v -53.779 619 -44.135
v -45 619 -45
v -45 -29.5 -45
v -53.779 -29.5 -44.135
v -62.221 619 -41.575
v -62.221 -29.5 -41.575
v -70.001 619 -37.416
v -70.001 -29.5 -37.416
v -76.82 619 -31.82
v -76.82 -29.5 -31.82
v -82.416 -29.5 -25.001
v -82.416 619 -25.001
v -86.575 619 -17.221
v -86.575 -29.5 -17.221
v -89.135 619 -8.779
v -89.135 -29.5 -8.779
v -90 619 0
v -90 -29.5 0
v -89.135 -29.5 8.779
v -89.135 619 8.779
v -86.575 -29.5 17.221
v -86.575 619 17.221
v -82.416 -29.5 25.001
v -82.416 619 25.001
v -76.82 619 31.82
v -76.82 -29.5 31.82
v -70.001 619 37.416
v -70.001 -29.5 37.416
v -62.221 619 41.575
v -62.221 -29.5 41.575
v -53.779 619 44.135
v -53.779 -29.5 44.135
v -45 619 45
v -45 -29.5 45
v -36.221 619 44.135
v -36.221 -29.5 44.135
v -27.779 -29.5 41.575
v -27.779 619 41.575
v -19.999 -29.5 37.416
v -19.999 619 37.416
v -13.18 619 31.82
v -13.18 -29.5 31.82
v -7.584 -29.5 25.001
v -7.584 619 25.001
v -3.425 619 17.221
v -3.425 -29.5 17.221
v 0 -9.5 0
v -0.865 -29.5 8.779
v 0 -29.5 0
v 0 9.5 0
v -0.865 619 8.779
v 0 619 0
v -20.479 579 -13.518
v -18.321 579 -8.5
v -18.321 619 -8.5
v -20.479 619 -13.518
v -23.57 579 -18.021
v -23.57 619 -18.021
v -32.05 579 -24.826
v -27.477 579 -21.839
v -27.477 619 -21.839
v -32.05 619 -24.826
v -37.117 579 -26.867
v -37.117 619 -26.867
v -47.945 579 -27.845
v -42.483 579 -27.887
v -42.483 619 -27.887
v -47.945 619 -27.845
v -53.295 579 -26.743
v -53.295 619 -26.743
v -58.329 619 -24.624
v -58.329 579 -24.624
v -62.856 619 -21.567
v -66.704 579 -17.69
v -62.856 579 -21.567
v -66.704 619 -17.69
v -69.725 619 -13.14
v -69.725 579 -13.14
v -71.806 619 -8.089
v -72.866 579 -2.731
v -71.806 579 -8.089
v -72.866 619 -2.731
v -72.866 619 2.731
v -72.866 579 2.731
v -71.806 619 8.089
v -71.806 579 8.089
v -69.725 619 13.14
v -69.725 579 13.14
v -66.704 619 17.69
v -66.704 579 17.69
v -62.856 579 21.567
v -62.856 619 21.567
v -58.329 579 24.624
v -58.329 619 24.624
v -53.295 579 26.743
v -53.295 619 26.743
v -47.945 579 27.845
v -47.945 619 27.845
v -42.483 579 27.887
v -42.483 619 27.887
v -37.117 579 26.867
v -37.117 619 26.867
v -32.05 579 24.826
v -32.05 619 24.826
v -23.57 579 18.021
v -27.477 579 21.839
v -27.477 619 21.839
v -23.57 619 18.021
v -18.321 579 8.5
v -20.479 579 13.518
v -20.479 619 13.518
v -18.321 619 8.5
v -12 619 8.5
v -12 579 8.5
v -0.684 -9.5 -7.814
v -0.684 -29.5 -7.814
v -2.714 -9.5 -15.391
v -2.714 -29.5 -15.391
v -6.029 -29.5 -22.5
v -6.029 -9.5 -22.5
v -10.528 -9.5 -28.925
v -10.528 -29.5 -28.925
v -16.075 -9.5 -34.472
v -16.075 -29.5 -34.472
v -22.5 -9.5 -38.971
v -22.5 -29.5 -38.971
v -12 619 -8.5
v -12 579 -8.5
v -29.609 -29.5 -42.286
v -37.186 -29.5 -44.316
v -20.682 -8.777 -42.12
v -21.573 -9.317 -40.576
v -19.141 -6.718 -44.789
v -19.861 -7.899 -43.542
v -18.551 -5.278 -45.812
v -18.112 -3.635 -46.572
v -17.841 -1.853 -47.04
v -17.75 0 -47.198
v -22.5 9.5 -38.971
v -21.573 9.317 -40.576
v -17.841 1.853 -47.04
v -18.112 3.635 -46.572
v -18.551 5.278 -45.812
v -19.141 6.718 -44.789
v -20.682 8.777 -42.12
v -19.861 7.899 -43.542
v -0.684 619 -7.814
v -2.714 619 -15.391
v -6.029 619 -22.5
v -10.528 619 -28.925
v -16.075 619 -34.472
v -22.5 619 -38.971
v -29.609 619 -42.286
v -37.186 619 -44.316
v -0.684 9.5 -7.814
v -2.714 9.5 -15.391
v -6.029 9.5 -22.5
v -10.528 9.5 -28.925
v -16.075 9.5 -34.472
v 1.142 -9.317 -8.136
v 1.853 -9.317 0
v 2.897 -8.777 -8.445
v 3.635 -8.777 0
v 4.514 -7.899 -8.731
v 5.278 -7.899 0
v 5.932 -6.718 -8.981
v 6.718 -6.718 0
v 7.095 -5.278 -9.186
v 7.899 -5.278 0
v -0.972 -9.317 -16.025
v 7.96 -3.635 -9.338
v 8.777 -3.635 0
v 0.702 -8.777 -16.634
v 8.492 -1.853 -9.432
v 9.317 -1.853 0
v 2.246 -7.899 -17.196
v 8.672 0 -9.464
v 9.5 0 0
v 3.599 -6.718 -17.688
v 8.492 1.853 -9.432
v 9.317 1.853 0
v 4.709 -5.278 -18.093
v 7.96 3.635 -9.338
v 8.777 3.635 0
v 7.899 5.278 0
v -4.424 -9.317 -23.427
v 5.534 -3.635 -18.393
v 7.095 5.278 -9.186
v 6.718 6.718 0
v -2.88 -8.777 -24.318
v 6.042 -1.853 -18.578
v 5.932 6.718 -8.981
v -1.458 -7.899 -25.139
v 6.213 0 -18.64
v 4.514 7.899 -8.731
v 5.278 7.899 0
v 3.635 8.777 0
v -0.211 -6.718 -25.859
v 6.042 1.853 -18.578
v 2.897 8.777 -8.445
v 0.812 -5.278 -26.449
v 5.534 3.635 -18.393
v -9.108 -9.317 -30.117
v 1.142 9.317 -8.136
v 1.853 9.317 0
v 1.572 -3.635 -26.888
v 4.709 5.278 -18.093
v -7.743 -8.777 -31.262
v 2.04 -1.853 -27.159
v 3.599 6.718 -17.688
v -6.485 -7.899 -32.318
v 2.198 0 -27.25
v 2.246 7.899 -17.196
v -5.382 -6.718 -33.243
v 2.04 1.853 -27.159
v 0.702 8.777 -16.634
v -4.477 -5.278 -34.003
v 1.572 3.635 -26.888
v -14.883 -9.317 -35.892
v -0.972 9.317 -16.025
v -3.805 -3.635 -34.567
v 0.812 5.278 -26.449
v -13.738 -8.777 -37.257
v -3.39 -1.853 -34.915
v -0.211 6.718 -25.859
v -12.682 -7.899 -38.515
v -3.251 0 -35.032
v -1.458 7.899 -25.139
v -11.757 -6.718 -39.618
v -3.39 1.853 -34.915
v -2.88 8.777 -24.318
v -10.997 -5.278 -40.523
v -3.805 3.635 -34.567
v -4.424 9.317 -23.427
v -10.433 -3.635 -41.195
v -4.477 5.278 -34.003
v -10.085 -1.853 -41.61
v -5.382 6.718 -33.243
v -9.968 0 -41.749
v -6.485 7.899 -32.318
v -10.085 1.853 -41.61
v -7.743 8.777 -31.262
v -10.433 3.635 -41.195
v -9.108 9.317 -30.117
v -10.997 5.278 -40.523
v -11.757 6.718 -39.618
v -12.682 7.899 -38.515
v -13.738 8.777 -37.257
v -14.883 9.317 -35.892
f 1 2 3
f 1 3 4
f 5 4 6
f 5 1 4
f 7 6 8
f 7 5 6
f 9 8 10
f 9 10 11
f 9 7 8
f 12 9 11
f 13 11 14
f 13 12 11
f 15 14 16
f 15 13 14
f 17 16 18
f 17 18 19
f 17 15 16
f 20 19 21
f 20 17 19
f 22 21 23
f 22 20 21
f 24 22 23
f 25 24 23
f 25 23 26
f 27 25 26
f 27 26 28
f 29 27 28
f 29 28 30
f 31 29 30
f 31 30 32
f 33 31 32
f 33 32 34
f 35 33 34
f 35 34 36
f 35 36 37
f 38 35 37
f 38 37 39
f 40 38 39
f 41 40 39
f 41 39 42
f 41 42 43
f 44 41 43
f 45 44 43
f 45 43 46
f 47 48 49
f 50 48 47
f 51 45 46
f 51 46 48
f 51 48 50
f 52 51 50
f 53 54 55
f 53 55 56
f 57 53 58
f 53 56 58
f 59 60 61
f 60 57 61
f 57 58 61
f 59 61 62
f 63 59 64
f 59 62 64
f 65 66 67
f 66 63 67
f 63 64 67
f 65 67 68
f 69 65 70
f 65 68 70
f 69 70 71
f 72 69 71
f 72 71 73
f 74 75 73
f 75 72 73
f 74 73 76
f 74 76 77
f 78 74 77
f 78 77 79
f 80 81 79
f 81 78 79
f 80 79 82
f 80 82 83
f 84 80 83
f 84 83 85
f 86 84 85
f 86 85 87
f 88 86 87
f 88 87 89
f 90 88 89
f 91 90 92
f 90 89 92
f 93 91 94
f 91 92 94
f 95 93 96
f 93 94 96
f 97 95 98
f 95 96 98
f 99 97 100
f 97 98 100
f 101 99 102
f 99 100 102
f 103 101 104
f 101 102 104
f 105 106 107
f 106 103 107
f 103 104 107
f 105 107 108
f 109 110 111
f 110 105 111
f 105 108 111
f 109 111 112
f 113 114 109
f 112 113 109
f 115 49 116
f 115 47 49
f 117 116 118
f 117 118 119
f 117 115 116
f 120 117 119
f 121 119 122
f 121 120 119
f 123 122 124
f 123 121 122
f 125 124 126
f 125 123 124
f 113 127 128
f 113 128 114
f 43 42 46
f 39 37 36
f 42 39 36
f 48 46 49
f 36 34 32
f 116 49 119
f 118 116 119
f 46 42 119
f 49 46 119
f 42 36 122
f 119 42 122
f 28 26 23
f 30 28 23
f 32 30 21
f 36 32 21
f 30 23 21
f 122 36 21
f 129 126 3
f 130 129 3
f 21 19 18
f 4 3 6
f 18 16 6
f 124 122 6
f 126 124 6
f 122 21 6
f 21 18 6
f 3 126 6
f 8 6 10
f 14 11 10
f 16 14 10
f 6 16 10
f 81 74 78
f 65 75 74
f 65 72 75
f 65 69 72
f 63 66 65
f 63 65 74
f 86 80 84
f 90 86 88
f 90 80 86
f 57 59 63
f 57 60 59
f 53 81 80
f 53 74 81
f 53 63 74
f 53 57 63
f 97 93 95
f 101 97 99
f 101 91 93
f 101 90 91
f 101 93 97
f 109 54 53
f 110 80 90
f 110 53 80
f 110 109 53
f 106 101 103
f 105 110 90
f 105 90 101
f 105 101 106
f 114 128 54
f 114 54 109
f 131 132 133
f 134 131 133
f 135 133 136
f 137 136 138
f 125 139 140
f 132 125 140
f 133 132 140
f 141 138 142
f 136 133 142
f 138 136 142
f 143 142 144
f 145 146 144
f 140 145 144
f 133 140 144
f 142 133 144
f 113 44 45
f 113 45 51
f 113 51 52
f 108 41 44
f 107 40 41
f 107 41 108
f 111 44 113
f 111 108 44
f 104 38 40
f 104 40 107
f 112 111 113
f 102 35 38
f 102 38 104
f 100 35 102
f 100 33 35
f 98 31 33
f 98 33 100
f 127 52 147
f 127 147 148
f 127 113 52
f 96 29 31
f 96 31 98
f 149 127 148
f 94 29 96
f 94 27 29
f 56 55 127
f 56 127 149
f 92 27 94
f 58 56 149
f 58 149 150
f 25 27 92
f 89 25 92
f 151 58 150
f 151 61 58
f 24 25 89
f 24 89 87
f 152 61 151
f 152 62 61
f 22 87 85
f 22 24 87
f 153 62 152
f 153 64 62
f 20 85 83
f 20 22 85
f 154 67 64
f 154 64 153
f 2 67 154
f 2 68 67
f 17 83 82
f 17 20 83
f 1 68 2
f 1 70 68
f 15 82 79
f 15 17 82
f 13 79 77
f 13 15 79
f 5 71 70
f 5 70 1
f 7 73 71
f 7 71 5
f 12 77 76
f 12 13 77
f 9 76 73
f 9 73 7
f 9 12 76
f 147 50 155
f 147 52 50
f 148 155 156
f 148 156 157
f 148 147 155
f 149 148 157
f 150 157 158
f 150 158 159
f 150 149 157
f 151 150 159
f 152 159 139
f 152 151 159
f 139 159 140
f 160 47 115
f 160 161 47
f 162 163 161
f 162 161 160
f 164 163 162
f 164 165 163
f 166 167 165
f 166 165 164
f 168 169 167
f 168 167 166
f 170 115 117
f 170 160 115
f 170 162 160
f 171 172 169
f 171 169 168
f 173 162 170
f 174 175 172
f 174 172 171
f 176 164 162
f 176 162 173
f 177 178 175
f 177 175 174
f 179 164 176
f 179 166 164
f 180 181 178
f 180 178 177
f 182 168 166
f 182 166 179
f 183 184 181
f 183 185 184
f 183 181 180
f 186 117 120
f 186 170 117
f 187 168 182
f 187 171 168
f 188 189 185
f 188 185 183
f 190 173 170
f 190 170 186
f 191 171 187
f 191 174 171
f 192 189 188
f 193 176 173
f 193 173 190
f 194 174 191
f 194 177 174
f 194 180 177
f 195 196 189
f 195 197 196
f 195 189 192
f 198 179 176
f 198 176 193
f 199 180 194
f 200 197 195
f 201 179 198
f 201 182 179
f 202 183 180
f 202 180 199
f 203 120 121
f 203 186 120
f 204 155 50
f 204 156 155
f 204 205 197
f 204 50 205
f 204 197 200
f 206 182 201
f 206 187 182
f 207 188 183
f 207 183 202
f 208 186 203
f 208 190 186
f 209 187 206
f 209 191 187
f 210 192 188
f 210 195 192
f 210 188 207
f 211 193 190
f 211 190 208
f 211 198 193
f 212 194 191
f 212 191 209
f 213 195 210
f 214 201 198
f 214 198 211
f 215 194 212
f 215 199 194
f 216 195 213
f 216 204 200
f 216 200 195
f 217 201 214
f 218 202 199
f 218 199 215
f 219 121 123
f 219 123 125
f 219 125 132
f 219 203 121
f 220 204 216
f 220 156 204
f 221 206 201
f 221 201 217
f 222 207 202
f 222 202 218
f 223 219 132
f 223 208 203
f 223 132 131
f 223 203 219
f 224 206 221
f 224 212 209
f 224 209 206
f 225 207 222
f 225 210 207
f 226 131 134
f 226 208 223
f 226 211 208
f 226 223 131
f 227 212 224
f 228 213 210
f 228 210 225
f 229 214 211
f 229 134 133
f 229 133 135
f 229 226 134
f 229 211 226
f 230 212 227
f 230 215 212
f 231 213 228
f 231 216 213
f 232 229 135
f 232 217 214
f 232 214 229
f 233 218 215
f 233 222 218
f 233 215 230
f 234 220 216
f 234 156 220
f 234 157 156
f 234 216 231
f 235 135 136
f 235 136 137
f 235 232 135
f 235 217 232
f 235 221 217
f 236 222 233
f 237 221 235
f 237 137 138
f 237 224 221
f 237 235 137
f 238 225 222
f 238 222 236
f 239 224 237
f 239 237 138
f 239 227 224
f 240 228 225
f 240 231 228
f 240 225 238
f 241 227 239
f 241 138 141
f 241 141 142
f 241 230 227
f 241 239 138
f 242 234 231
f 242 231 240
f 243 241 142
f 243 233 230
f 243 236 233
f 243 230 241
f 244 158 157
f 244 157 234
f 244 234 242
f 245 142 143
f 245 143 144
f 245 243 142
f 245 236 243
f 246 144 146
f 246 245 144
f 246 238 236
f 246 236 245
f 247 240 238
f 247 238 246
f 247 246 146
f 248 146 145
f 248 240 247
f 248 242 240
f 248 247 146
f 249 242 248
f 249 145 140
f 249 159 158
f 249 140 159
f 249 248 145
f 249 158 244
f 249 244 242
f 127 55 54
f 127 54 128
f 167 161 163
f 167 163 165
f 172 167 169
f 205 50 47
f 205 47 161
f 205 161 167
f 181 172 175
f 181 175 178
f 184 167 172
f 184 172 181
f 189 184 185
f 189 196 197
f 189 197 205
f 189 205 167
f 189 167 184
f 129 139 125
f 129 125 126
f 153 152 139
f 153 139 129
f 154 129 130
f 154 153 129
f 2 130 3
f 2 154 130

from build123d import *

# Parameters (mm, degrees)
REVOLVE_THIN1_ANGLE = 60
SKETCH3_R           = 45
BOSS_EXTRUDE2_DEPTH = 648.5
SKETCH4_R           = 28
CUT_EXTRUDE1_DEPTH  = 40
CUT_EXTRUDE2_DEPTH  = 40


# Read off the part's stored shape, not the designer's step: Revolve-Thin1
with BuildPart() as part:
    # Revolve-Thin1 outline → Revolve-Thin1 (revolve)
    with BuildSketch(Plane(origin=(-45, 0, 0), x_dir=(1, 0, 0), z_dir=(0, 0, 1))):
        with BuildLine():
            Line((35, -19.5), (0, -19.5))
            Line((0, -19.5), (0, -29.5))
            Line((0, -29.5), (45, -29.5))
            Line((45, -29.5), (45, -9.5))
            ThreePointArc((45, -9.5), (54.5, 0), (45, 9.5))
            Line((45, 9.5), (45, 619))
            Line((45, 619), (0, 619))
            Line((0, 619), (0, 609))
            Line((0, 609), (35, 609))
            Line((35, 609), (35, -19.5))
        make_face()
    revolve(axis=Axis((-45, 0, 0), (0, 1, 0)), revolution_arc=REVOLVE_THIN1_ANGLE)

    # Sketch3 → Boss-Extrude2 (add)
    with BuildSketch(Plane(origin=(0, 619, 0), x_dir=(1, 0, 0), z_dir=(0, 1, 0))):
        with Locations(Location((-45, 0, 0), (0, 0, 90))):
            Circle(SKETCH3_R)
    extrude(amount=-BOSS_EXTRUDE2_DEPTH)

    # Sketch4 → Cut-Extrude1 (cut)
    with BuildSketch(Plane(origin=(0, 619, 0), x_dir=(1, 0, 0), z_dir=(0, 1, 0))):
        with Locations(Location((-45, 0, 0), (0, 0, 270))):
            Circle(SKETCH4_R)
    extrude(amount=-CUT_EXTRUDE1_DEPTH, mode=Mode.SUBTRACT)

    # Sketch5 → Cut-Extrude2 (cut)
    with BuildSketch(Plane(origin=(0, 619, 0), x_dir=(1, 0, 0), z_dir=(0, 1, 0))):
        with BuildLine():
            Line((-18.321356856, 8.5), (-12, 8.5))
            Line((-12, 8.5), (-12, -8.5))
            Line((-12, -8.5), (-18.321356856, -8.5))
            ThreePointArc((-18.321356856, -8.5), (-17, 0), (-18.321356856, 8.5))
        make_face()
    extrude(amount=-CUT_EXTRUDE2_DEPTH, mode=Mode.SUBTRACT)


solid = part.part
